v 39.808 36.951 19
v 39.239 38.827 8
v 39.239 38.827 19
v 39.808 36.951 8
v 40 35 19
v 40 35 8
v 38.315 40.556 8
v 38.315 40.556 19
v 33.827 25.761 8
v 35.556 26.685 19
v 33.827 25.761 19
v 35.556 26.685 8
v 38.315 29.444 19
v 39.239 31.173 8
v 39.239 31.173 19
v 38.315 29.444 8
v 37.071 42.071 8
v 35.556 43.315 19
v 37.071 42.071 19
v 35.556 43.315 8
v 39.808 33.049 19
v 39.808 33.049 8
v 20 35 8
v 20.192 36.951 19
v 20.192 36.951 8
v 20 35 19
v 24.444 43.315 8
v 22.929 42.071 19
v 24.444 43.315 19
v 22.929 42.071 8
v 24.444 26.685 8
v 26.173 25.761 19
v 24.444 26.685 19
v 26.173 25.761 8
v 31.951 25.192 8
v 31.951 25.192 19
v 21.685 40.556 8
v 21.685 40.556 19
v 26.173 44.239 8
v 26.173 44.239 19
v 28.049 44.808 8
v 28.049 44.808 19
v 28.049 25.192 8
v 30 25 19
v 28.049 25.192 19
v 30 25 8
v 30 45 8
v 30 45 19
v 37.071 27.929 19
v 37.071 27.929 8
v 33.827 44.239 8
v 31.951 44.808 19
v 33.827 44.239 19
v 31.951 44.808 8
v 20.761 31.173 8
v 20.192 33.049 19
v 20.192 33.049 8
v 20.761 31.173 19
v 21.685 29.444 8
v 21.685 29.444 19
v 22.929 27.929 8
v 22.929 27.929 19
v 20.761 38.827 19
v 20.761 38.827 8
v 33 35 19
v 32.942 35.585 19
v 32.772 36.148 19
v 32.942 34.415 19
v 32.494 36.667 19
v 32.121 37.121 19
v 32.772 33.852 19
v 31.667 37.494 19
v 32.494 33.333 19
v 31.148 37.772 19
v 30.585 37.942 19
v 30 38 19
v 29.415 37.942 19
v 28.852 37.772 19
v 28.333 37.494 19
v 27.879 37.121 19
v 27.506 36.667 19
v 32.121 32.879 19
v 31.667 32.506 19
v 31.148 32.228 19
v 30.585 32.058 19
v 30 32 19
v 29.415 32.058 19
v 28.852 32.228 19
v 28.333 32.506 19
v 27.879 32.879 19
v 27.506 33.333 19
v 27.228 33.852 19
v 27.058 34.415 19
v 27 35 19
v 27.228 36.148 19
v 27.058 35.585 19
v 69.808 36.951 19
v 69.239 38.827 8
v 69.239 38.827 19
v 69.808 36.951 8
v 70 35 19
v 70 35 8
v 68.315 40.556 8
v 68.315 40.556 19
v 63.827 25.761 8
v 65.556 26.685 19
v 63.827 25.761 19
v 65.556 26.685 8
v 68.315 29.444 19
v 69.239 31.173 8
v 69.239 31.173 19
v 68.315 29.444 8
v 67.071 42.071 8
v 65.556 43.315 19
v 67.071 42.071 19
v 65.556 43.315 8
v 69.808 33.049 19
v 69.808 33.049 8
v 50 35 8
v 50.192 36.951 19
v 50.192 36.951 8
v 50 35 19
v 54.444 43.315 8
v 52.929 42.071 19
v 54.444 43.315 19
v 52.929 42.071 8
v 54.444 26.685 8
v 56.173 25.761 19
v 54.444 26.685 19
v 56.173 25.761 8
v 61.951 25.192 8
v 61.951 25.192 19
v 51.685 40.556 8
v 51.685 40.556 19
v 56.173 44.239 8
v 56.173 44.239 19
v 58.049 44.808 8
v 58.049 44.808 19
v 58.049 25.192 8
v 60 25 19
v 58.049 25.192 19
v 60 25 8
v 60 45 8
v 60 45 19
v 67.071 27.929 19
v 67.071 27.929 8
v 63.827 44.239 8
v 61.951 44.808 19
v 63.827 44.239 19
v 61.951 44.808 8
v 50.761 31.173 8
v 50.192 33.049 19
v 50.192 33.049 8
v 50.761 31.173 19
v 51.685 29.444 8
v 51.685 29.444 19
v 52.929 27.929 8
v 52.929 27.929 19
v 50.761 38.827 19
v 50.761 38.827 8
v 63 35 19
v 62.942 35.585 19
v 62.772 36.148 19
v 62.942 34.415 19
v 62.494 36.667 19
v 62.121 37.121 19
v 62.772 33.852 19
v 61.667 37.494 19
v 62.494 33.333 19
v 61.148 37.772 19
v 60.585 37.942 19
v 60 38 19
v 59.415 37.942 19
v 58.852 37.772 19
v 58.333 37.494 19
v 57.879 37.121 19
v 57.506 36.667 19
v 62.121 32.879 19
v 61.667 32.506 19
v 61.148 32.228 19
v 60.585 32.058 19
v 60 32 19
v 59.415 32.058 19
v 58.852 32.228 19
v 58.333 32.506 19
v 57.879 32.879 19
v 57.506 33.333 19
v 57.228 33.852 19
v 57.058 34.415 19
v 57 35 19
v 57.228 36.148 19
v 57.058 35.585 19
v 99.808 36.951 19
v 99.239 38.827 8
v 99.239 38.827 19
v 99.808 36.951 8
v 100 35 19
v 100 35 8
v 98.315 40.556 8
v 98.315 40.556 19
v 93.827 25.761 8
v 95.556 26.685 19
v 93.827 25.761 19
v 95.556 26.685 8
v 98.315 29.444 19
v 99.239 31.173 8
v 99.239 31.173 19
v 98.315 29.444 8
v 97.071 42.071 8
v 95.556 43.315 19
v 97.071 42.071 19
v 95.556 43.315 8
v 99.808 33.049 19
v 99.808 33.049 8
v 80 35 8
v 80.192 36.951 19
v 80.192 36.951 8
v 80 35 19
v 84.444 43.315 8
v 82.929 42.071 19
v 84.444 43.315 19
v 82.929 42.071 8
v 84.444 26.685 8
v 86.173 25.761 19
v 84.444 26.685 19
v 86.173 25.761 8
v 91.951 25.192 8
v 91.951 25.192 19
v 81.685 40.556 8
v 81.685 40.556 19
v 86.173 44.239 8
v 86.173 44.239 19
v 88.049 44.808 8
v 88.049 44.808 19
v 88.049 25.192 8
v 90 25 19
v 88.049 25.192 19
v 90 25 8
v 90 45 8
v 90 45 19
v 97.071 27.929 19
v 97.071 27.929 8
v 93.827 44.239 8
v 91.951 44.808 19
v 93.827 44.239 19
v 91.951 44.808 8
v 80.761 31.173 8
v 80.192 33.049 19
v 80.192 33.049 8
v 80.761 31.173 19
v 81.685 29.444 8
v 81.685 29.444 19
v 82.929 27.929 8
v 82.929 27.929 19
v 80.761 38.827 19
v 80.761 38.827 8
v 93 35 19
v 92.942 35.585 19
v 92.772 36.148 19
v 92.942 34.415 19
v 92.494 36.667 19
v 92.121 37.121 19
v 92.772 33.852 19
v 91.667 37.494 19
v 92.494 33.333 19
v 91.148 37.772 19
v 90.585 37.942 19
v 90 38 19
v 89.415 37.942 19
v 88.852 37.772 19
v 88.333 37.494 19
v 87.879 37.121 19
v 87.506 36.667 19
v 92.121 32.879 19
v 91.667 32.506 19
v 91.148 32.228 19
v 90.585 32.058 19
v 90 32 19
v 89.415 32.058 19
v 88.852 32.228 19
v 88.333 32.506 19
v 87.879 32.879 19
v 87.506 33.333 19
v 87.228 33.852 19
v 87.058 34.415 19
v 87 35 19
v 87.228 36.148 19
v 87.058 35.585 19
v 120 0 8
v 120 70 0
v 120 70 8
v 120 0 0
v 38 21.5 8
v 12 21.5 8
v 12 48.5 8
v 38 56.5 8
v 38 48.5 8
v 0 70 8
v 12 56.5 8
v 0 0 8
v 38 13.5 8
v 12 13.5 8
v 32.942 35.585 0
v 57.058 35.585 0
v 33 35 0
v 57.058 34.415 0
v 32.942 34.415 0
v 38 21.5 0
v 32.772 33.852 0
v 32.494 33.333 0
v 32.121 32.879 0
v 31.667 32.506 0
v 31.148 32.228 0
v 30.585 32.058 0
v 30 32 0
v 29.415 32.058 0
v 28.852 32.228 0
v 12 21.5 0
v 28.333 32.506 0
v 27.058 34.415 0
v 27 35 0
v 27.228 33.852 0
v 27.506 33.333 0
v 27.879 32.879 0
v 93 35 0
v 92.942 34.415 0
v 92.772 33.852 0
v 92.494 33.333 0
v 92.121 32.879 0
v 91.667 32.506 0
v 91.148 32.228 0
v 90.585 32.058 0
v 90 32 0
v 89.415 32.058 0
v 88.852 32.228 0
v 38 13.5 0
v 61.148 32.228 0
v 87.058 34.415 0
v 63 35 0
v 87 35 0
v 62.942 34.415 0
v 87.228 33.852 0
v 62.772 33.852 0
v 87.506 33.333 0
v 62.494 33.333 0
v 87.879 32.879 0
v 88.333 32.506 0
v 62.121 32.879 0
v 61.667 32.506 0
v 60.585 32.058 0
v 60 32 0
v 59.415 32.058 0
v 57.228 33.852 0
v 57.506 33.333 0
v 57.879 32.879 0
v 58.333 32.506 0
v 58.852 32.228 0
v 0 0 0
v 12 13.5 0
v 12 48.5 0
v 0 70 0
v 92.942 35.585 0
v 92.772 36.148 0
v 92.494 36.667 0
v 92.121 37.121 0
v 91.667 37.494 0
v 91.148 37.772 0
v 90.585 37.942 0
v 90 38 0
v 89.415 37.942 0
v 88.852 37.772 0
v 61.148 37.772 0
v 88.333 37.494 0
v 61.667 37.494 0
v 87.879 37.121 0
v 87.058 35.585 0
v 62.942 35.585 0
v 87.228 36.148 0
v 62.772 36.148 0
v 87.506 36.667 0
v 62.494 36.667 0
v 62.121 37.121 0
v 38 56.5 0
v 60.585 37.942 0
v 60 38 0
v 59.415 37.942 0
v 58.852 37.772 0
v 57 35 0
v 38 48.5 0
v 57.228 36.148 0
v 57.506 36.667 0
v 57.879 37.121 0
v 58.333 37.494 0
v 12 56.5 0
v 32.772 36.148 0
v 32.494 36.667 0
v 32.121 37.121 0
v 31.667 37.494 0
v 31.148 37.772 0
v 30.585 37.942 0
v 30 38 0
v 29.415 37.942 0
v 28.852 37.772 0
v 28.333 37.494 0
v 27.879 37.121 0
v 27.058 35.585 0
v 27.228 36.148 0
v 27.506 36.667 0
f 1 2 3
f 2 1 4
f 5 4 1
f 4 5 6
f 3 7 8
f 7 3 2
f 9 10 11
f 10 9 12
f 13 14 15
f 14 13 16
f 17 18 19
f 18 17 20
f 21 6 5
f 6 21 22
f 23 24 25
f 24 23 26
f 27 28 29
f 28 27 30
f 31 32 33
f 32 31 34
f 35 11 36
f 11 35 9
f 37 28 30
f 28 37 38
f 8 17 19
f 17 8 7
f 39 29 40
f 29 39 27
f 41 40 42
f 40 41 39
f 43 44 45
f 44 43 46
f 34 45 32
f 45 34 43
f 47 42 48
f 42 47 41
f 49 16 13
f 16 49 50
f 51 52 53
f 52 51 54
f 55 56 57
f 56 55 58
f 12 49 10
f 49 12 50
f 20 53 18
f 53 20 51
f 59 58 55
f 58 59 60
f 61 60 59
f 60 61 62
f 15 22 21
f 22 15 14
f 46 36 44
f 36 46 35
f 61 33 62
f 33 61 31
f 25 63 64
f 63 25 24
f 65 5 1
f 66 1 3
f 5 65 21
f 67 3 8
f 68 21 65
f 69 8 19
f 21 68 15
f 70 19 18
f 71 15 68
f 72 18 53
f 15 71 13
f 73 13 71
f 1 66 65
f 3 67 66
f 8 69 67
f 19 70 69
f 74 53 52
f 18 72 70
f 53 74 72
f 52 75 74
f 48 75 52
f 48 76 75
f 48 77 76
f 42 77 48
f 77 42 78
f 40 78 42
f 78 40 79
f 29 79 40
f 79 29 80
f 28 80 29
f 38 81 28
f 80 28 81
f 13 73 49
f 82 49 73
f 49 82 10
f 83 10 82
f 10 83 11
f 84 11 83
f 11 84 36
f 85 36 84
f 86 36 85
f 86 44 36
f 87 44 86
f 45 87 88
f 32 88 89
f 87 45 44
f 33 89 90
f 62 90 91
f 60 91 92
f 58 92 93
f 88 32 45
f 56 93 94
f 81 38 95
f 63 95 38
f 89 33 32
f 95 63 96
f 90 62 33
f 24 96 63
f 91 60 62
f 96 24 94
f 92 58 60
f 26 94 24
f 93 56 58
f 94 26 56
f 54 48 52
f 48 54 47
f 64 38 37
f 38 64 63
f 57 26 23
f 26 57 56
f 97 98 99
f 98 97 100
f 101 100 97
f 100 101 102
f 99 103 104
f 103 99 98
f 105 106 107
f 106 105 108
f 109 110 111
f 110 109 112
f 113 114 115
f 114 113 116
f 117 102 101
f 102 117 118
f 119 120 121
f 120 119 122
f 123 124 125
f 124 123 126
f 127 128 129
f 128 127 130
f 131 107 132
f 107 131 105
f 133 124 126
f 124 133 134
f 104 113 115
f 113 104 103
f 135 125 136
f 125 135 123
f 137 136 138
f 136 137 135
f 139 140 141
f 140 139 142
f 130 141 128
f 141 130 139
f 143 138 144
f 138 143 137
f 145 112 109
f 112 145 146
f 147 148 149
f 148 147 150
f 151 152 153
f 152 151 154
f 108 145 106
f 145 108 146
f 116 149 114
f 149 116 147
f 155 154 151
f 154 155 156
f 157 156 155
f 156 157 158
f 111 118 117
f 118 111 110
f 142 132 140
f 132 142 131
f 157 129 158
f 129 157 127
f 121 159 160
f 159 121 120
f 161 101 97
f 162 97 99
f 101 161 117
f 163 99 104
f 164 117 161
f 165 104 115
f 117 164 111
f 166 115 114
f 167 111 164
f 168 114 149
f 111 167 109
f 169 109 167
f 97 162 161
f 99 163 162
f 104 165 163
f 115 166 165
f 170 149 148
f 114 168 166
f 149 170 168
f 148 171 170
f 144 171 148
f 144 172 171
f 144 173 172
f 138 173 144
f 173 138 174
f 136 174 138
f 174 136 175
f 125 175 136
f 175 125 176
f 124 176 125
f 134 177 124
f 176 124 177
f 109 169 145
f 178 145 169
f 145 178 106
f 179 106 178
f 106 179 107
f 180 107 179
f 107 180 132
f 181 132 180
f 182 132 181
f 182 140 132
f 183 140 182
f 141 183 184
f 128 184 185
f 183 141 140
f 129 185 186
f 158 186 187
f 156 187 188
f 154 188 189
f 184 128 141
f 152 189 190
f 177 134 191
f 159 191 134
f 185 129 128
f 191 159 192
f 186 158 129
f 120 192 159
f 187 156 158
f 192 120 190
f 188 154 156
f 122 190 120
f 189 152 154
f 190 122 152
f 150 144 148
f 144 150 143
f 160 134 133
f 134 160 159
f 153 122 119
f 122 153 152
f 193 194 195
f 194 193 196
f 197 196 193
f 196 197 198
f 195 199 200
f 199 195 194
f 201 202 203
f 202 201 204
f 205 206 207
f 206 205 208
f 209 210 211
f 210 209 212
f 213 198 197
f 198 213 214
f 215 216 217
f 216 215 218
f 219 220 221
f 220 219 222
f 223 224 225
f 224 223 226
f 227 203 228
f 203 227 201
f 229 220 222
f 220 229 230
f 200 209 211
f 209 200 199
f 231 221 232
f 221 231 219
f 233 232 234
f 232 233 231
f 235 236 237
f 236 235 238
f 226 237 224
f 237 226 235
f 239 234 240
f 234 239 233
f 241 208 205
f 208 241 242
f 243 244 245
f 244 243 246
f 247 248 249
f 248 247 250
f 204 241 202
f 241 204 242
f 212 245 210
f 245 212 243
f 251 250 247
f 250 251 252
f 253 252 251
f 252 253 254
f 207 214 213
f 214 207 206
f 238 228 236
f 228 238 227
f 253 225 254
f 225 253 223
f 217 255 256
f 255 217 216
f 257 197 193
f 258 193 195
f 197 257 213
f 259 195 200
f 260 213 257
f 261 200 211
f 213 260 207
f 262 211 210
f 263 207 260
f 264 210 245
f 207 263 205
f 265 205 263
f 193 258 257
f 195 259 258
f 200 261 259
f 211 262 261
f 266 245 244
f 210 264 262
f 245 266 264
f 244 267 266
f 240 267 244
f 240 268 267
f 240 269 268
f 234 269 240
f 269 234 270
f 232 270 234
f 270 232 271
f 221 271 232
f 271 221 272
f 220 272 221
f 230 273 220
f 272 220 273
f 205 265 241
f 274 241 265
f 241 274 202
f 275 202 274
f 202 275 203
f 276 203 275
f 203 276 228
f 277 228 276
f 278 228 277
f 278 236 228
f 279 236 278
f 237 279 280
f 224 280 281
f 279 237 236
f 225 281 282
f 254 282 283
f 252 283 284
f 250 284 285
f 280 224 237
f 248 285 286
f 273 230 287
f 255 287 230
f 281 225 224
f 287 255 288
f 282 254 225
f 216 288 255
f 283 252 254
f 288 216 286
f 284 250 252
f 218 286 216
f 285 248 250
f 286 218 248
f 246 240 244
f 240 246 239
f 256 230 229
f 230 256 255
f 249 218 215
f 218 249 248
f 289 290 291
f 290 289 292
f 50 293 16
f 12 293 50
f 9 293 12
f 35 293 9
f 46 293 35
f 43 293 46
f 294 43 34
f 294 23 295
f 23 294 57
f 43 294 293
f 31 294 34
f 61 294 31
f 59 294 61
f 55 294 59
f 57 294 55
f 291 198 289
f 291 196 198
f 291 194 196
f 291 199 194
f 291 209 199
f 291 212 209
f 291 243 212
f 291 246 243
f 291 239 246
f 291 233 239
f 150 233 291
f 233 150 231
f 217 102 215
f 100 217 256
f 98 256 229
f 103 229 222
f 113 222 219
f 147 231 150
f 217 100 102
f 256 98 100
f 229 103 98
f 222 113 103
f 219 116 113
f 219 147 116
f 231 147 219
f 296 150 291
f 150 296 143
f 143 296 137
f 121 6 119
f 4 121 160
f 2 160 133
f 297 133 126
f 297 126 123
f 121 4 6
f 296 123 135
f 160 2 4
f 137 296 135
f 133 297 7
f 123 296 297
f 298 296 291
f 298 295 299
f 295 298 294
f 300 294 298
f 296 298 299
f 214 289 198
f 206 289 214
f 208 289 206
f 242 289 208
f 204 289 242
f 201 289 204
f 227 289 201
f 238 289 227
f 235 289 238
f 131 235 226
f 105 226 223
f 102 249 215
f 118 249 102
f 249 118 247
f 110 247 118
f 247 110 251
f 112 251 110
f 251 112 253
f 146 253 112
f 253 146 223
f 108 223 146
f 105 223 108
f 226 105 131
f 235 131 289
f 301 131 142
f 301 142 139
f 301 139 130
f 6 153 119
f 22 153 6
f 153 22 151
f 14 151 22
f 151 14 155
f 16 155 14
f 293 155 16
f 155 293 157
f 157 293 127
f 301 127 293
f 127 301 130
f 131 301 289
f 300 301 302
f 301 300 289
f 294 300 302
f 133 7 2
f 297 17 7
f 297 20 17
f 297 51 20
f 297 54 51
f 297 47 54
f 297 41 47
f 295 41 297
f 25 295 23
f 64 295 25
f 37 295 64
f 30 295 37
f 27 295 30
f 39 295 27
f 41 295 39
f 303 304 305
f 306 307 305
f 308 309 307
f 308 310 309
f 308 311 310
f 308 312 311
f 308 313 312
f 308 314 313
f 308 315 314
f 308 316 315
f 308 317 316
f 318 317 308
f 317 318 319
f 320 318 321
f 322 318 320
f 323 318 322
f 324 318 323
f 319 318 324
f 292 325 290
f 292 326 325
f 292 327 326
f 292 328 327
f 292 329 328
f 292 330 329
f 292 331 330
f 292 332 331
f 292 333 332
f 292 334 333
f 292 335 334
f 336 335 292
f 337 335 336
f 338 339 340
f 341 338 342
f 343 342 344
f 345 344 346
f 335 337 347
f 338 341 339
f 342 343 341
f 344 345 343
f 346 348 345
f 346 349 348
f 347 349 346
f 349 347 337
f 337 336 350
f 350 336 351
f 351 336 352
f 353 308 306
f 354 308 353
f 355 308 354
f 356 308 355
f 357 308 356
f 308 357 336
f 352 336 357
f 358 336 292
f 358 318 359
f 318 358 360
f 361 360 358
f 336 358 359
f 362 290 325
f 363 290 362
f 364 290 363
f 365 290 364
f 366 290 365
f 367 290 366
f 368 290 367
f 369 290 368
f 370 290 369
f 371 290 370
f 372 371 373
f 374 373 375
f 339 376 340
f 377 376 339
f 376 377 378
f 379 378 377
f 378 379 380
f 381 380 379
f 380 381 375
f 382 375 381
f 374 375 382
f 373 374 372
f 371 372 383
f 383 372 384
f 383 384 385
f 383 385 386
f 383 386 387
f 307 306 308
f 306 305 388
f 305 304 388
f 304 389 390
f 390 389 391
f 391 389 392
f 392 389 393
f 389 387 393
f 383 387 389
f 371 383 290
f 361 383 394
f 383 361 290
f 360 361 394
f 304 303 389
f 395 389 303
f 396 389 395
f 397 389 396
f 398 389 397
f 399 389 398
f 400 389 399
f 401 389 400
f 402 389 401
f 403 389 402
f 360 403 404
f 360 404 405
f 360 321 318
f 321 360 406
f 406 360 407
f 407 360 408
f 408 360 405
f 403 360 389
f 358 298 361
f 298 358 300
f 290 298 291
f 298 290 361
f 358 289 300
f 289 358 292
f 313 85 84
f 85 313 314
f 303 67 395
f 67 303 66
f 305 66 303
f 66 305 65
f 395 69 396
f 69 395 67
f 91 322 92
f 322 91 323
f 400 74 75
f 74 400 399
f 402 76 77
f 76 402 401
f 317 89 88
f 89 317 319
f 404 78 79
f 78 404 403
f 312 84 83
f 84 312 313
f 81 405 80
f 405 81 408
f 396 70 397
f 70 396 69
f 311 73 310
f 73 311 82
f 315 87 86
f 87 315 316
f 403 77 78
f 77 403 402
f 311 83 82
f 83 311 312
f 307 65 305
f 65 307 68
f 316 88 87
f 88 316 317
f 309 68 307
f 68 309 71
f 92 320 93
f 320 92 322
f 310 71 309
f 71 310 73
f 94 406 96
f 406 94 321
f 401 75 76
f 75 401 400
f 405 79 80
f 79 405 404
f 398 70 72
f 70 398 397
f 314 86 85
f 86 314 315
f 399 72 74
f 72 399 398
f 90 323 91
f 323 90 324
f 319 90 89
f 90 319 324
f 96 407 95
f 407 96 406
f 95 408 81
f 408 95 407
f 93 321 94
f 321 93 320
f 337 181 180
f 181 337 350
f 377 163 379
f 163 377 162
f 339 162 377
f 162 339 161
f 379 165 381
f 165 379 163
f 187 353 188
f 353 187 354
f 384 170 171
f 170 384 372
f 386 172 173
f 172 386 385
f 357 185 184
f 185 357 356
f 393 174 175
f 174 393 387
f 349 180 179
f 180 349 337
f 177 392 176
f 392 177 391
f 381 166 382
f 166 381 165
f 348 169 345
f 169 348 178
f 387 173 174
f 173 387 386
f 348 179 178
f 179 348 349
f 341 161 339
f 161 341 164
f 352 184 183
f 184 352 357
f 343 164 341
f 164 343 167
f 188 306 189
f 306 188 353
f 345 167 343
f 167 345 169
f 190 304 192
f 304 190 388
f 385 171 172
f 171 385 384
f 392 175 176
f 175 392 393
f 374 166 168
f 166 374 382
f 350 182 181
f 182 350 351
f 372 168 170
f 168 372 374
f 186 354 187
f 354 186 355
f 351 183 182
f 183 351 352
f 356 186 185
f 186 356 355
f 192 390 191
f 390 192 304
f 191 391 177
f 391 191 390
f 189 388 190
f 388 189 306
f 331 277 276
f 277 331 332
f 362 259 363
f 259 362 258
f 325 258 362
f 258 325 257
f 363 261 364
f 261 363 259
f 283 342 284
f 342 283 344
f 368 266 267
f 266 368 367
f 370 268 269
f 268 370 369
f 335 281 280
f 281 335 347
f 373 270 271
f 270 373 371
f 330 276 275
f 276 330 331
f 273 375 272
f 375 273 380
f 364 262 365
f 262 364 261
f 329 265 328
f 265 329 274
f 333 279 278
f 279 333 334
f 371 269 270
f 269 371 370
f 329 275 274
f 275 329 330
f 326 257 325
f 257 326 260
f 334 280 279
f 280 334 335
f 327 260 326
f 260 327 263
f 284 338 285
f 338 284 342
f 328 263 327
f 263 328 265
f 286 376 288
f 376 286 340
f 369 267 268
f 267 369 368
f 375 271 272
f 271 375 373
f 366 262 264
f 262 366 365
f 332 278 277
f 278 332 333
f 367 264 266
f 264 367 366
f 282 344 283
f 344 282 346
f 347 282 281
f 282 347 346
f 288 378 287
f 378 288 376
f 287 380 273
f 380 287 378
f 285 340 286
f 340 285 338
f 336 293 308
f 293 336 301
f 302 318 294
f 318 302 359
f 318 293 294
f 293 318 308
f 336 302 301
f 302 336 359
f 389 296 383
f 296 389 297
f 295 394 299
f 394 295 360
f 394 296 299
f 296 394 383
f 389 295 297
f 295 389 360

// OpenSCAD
$fn = 32;

// ----------------------------------------------------------------------
// Drill jig: three_boss_slot jig
// ----------------------------------------------------------------------

// --- parameters (mm) ---
plate_l = 120;            // plate length, X
plate_w = 70;             // plate width, Y
plate_t = 8;              // plate thickness
boss_d = 20;              // guide boss diameter
boss_h = 12;              // boss height above the plate
guide_d = 6;              // guide hole diameter
boss_pitch = 30;          // boss pitch
slot_w = 8;               // clamp slot width
slot_l = 26;              // clamp slot length
slot_x = 12;              // slot start X

n_boss = 3;  // guide bosses
boss_x0 = (plate_l - (n_boss - 1) * boss_pitch) / 2;  // first boss X
boss_top = plate_t - 1 + boss_h;  // boss crown height
total_h = boss_top;  // overall height

difference() {
  union() {
  cube([plate_l, plate_w, plate_t]);
  for (i = [0 : n_boss - 1])
    translate([boss_x0 + i * boss_pitch, plate_w / 2, plate_t - 1])
      cylinder(h = boss_h, d = boss_d);
  }
  for (i = [0 : n_boss - 1])
    translate([boss_x0 + i * boss_pitch, plate_w / 2, -1])
      cylinder(h = plate_t + boss_h, d = guide_d);
  for (cy = [plate_w * 0.25, plate_w * 0.75])
    translate([slot_x, cy - slot_w / 2, -1])
      cube([slot_l, slot_w, plate_t + 2]);
}
